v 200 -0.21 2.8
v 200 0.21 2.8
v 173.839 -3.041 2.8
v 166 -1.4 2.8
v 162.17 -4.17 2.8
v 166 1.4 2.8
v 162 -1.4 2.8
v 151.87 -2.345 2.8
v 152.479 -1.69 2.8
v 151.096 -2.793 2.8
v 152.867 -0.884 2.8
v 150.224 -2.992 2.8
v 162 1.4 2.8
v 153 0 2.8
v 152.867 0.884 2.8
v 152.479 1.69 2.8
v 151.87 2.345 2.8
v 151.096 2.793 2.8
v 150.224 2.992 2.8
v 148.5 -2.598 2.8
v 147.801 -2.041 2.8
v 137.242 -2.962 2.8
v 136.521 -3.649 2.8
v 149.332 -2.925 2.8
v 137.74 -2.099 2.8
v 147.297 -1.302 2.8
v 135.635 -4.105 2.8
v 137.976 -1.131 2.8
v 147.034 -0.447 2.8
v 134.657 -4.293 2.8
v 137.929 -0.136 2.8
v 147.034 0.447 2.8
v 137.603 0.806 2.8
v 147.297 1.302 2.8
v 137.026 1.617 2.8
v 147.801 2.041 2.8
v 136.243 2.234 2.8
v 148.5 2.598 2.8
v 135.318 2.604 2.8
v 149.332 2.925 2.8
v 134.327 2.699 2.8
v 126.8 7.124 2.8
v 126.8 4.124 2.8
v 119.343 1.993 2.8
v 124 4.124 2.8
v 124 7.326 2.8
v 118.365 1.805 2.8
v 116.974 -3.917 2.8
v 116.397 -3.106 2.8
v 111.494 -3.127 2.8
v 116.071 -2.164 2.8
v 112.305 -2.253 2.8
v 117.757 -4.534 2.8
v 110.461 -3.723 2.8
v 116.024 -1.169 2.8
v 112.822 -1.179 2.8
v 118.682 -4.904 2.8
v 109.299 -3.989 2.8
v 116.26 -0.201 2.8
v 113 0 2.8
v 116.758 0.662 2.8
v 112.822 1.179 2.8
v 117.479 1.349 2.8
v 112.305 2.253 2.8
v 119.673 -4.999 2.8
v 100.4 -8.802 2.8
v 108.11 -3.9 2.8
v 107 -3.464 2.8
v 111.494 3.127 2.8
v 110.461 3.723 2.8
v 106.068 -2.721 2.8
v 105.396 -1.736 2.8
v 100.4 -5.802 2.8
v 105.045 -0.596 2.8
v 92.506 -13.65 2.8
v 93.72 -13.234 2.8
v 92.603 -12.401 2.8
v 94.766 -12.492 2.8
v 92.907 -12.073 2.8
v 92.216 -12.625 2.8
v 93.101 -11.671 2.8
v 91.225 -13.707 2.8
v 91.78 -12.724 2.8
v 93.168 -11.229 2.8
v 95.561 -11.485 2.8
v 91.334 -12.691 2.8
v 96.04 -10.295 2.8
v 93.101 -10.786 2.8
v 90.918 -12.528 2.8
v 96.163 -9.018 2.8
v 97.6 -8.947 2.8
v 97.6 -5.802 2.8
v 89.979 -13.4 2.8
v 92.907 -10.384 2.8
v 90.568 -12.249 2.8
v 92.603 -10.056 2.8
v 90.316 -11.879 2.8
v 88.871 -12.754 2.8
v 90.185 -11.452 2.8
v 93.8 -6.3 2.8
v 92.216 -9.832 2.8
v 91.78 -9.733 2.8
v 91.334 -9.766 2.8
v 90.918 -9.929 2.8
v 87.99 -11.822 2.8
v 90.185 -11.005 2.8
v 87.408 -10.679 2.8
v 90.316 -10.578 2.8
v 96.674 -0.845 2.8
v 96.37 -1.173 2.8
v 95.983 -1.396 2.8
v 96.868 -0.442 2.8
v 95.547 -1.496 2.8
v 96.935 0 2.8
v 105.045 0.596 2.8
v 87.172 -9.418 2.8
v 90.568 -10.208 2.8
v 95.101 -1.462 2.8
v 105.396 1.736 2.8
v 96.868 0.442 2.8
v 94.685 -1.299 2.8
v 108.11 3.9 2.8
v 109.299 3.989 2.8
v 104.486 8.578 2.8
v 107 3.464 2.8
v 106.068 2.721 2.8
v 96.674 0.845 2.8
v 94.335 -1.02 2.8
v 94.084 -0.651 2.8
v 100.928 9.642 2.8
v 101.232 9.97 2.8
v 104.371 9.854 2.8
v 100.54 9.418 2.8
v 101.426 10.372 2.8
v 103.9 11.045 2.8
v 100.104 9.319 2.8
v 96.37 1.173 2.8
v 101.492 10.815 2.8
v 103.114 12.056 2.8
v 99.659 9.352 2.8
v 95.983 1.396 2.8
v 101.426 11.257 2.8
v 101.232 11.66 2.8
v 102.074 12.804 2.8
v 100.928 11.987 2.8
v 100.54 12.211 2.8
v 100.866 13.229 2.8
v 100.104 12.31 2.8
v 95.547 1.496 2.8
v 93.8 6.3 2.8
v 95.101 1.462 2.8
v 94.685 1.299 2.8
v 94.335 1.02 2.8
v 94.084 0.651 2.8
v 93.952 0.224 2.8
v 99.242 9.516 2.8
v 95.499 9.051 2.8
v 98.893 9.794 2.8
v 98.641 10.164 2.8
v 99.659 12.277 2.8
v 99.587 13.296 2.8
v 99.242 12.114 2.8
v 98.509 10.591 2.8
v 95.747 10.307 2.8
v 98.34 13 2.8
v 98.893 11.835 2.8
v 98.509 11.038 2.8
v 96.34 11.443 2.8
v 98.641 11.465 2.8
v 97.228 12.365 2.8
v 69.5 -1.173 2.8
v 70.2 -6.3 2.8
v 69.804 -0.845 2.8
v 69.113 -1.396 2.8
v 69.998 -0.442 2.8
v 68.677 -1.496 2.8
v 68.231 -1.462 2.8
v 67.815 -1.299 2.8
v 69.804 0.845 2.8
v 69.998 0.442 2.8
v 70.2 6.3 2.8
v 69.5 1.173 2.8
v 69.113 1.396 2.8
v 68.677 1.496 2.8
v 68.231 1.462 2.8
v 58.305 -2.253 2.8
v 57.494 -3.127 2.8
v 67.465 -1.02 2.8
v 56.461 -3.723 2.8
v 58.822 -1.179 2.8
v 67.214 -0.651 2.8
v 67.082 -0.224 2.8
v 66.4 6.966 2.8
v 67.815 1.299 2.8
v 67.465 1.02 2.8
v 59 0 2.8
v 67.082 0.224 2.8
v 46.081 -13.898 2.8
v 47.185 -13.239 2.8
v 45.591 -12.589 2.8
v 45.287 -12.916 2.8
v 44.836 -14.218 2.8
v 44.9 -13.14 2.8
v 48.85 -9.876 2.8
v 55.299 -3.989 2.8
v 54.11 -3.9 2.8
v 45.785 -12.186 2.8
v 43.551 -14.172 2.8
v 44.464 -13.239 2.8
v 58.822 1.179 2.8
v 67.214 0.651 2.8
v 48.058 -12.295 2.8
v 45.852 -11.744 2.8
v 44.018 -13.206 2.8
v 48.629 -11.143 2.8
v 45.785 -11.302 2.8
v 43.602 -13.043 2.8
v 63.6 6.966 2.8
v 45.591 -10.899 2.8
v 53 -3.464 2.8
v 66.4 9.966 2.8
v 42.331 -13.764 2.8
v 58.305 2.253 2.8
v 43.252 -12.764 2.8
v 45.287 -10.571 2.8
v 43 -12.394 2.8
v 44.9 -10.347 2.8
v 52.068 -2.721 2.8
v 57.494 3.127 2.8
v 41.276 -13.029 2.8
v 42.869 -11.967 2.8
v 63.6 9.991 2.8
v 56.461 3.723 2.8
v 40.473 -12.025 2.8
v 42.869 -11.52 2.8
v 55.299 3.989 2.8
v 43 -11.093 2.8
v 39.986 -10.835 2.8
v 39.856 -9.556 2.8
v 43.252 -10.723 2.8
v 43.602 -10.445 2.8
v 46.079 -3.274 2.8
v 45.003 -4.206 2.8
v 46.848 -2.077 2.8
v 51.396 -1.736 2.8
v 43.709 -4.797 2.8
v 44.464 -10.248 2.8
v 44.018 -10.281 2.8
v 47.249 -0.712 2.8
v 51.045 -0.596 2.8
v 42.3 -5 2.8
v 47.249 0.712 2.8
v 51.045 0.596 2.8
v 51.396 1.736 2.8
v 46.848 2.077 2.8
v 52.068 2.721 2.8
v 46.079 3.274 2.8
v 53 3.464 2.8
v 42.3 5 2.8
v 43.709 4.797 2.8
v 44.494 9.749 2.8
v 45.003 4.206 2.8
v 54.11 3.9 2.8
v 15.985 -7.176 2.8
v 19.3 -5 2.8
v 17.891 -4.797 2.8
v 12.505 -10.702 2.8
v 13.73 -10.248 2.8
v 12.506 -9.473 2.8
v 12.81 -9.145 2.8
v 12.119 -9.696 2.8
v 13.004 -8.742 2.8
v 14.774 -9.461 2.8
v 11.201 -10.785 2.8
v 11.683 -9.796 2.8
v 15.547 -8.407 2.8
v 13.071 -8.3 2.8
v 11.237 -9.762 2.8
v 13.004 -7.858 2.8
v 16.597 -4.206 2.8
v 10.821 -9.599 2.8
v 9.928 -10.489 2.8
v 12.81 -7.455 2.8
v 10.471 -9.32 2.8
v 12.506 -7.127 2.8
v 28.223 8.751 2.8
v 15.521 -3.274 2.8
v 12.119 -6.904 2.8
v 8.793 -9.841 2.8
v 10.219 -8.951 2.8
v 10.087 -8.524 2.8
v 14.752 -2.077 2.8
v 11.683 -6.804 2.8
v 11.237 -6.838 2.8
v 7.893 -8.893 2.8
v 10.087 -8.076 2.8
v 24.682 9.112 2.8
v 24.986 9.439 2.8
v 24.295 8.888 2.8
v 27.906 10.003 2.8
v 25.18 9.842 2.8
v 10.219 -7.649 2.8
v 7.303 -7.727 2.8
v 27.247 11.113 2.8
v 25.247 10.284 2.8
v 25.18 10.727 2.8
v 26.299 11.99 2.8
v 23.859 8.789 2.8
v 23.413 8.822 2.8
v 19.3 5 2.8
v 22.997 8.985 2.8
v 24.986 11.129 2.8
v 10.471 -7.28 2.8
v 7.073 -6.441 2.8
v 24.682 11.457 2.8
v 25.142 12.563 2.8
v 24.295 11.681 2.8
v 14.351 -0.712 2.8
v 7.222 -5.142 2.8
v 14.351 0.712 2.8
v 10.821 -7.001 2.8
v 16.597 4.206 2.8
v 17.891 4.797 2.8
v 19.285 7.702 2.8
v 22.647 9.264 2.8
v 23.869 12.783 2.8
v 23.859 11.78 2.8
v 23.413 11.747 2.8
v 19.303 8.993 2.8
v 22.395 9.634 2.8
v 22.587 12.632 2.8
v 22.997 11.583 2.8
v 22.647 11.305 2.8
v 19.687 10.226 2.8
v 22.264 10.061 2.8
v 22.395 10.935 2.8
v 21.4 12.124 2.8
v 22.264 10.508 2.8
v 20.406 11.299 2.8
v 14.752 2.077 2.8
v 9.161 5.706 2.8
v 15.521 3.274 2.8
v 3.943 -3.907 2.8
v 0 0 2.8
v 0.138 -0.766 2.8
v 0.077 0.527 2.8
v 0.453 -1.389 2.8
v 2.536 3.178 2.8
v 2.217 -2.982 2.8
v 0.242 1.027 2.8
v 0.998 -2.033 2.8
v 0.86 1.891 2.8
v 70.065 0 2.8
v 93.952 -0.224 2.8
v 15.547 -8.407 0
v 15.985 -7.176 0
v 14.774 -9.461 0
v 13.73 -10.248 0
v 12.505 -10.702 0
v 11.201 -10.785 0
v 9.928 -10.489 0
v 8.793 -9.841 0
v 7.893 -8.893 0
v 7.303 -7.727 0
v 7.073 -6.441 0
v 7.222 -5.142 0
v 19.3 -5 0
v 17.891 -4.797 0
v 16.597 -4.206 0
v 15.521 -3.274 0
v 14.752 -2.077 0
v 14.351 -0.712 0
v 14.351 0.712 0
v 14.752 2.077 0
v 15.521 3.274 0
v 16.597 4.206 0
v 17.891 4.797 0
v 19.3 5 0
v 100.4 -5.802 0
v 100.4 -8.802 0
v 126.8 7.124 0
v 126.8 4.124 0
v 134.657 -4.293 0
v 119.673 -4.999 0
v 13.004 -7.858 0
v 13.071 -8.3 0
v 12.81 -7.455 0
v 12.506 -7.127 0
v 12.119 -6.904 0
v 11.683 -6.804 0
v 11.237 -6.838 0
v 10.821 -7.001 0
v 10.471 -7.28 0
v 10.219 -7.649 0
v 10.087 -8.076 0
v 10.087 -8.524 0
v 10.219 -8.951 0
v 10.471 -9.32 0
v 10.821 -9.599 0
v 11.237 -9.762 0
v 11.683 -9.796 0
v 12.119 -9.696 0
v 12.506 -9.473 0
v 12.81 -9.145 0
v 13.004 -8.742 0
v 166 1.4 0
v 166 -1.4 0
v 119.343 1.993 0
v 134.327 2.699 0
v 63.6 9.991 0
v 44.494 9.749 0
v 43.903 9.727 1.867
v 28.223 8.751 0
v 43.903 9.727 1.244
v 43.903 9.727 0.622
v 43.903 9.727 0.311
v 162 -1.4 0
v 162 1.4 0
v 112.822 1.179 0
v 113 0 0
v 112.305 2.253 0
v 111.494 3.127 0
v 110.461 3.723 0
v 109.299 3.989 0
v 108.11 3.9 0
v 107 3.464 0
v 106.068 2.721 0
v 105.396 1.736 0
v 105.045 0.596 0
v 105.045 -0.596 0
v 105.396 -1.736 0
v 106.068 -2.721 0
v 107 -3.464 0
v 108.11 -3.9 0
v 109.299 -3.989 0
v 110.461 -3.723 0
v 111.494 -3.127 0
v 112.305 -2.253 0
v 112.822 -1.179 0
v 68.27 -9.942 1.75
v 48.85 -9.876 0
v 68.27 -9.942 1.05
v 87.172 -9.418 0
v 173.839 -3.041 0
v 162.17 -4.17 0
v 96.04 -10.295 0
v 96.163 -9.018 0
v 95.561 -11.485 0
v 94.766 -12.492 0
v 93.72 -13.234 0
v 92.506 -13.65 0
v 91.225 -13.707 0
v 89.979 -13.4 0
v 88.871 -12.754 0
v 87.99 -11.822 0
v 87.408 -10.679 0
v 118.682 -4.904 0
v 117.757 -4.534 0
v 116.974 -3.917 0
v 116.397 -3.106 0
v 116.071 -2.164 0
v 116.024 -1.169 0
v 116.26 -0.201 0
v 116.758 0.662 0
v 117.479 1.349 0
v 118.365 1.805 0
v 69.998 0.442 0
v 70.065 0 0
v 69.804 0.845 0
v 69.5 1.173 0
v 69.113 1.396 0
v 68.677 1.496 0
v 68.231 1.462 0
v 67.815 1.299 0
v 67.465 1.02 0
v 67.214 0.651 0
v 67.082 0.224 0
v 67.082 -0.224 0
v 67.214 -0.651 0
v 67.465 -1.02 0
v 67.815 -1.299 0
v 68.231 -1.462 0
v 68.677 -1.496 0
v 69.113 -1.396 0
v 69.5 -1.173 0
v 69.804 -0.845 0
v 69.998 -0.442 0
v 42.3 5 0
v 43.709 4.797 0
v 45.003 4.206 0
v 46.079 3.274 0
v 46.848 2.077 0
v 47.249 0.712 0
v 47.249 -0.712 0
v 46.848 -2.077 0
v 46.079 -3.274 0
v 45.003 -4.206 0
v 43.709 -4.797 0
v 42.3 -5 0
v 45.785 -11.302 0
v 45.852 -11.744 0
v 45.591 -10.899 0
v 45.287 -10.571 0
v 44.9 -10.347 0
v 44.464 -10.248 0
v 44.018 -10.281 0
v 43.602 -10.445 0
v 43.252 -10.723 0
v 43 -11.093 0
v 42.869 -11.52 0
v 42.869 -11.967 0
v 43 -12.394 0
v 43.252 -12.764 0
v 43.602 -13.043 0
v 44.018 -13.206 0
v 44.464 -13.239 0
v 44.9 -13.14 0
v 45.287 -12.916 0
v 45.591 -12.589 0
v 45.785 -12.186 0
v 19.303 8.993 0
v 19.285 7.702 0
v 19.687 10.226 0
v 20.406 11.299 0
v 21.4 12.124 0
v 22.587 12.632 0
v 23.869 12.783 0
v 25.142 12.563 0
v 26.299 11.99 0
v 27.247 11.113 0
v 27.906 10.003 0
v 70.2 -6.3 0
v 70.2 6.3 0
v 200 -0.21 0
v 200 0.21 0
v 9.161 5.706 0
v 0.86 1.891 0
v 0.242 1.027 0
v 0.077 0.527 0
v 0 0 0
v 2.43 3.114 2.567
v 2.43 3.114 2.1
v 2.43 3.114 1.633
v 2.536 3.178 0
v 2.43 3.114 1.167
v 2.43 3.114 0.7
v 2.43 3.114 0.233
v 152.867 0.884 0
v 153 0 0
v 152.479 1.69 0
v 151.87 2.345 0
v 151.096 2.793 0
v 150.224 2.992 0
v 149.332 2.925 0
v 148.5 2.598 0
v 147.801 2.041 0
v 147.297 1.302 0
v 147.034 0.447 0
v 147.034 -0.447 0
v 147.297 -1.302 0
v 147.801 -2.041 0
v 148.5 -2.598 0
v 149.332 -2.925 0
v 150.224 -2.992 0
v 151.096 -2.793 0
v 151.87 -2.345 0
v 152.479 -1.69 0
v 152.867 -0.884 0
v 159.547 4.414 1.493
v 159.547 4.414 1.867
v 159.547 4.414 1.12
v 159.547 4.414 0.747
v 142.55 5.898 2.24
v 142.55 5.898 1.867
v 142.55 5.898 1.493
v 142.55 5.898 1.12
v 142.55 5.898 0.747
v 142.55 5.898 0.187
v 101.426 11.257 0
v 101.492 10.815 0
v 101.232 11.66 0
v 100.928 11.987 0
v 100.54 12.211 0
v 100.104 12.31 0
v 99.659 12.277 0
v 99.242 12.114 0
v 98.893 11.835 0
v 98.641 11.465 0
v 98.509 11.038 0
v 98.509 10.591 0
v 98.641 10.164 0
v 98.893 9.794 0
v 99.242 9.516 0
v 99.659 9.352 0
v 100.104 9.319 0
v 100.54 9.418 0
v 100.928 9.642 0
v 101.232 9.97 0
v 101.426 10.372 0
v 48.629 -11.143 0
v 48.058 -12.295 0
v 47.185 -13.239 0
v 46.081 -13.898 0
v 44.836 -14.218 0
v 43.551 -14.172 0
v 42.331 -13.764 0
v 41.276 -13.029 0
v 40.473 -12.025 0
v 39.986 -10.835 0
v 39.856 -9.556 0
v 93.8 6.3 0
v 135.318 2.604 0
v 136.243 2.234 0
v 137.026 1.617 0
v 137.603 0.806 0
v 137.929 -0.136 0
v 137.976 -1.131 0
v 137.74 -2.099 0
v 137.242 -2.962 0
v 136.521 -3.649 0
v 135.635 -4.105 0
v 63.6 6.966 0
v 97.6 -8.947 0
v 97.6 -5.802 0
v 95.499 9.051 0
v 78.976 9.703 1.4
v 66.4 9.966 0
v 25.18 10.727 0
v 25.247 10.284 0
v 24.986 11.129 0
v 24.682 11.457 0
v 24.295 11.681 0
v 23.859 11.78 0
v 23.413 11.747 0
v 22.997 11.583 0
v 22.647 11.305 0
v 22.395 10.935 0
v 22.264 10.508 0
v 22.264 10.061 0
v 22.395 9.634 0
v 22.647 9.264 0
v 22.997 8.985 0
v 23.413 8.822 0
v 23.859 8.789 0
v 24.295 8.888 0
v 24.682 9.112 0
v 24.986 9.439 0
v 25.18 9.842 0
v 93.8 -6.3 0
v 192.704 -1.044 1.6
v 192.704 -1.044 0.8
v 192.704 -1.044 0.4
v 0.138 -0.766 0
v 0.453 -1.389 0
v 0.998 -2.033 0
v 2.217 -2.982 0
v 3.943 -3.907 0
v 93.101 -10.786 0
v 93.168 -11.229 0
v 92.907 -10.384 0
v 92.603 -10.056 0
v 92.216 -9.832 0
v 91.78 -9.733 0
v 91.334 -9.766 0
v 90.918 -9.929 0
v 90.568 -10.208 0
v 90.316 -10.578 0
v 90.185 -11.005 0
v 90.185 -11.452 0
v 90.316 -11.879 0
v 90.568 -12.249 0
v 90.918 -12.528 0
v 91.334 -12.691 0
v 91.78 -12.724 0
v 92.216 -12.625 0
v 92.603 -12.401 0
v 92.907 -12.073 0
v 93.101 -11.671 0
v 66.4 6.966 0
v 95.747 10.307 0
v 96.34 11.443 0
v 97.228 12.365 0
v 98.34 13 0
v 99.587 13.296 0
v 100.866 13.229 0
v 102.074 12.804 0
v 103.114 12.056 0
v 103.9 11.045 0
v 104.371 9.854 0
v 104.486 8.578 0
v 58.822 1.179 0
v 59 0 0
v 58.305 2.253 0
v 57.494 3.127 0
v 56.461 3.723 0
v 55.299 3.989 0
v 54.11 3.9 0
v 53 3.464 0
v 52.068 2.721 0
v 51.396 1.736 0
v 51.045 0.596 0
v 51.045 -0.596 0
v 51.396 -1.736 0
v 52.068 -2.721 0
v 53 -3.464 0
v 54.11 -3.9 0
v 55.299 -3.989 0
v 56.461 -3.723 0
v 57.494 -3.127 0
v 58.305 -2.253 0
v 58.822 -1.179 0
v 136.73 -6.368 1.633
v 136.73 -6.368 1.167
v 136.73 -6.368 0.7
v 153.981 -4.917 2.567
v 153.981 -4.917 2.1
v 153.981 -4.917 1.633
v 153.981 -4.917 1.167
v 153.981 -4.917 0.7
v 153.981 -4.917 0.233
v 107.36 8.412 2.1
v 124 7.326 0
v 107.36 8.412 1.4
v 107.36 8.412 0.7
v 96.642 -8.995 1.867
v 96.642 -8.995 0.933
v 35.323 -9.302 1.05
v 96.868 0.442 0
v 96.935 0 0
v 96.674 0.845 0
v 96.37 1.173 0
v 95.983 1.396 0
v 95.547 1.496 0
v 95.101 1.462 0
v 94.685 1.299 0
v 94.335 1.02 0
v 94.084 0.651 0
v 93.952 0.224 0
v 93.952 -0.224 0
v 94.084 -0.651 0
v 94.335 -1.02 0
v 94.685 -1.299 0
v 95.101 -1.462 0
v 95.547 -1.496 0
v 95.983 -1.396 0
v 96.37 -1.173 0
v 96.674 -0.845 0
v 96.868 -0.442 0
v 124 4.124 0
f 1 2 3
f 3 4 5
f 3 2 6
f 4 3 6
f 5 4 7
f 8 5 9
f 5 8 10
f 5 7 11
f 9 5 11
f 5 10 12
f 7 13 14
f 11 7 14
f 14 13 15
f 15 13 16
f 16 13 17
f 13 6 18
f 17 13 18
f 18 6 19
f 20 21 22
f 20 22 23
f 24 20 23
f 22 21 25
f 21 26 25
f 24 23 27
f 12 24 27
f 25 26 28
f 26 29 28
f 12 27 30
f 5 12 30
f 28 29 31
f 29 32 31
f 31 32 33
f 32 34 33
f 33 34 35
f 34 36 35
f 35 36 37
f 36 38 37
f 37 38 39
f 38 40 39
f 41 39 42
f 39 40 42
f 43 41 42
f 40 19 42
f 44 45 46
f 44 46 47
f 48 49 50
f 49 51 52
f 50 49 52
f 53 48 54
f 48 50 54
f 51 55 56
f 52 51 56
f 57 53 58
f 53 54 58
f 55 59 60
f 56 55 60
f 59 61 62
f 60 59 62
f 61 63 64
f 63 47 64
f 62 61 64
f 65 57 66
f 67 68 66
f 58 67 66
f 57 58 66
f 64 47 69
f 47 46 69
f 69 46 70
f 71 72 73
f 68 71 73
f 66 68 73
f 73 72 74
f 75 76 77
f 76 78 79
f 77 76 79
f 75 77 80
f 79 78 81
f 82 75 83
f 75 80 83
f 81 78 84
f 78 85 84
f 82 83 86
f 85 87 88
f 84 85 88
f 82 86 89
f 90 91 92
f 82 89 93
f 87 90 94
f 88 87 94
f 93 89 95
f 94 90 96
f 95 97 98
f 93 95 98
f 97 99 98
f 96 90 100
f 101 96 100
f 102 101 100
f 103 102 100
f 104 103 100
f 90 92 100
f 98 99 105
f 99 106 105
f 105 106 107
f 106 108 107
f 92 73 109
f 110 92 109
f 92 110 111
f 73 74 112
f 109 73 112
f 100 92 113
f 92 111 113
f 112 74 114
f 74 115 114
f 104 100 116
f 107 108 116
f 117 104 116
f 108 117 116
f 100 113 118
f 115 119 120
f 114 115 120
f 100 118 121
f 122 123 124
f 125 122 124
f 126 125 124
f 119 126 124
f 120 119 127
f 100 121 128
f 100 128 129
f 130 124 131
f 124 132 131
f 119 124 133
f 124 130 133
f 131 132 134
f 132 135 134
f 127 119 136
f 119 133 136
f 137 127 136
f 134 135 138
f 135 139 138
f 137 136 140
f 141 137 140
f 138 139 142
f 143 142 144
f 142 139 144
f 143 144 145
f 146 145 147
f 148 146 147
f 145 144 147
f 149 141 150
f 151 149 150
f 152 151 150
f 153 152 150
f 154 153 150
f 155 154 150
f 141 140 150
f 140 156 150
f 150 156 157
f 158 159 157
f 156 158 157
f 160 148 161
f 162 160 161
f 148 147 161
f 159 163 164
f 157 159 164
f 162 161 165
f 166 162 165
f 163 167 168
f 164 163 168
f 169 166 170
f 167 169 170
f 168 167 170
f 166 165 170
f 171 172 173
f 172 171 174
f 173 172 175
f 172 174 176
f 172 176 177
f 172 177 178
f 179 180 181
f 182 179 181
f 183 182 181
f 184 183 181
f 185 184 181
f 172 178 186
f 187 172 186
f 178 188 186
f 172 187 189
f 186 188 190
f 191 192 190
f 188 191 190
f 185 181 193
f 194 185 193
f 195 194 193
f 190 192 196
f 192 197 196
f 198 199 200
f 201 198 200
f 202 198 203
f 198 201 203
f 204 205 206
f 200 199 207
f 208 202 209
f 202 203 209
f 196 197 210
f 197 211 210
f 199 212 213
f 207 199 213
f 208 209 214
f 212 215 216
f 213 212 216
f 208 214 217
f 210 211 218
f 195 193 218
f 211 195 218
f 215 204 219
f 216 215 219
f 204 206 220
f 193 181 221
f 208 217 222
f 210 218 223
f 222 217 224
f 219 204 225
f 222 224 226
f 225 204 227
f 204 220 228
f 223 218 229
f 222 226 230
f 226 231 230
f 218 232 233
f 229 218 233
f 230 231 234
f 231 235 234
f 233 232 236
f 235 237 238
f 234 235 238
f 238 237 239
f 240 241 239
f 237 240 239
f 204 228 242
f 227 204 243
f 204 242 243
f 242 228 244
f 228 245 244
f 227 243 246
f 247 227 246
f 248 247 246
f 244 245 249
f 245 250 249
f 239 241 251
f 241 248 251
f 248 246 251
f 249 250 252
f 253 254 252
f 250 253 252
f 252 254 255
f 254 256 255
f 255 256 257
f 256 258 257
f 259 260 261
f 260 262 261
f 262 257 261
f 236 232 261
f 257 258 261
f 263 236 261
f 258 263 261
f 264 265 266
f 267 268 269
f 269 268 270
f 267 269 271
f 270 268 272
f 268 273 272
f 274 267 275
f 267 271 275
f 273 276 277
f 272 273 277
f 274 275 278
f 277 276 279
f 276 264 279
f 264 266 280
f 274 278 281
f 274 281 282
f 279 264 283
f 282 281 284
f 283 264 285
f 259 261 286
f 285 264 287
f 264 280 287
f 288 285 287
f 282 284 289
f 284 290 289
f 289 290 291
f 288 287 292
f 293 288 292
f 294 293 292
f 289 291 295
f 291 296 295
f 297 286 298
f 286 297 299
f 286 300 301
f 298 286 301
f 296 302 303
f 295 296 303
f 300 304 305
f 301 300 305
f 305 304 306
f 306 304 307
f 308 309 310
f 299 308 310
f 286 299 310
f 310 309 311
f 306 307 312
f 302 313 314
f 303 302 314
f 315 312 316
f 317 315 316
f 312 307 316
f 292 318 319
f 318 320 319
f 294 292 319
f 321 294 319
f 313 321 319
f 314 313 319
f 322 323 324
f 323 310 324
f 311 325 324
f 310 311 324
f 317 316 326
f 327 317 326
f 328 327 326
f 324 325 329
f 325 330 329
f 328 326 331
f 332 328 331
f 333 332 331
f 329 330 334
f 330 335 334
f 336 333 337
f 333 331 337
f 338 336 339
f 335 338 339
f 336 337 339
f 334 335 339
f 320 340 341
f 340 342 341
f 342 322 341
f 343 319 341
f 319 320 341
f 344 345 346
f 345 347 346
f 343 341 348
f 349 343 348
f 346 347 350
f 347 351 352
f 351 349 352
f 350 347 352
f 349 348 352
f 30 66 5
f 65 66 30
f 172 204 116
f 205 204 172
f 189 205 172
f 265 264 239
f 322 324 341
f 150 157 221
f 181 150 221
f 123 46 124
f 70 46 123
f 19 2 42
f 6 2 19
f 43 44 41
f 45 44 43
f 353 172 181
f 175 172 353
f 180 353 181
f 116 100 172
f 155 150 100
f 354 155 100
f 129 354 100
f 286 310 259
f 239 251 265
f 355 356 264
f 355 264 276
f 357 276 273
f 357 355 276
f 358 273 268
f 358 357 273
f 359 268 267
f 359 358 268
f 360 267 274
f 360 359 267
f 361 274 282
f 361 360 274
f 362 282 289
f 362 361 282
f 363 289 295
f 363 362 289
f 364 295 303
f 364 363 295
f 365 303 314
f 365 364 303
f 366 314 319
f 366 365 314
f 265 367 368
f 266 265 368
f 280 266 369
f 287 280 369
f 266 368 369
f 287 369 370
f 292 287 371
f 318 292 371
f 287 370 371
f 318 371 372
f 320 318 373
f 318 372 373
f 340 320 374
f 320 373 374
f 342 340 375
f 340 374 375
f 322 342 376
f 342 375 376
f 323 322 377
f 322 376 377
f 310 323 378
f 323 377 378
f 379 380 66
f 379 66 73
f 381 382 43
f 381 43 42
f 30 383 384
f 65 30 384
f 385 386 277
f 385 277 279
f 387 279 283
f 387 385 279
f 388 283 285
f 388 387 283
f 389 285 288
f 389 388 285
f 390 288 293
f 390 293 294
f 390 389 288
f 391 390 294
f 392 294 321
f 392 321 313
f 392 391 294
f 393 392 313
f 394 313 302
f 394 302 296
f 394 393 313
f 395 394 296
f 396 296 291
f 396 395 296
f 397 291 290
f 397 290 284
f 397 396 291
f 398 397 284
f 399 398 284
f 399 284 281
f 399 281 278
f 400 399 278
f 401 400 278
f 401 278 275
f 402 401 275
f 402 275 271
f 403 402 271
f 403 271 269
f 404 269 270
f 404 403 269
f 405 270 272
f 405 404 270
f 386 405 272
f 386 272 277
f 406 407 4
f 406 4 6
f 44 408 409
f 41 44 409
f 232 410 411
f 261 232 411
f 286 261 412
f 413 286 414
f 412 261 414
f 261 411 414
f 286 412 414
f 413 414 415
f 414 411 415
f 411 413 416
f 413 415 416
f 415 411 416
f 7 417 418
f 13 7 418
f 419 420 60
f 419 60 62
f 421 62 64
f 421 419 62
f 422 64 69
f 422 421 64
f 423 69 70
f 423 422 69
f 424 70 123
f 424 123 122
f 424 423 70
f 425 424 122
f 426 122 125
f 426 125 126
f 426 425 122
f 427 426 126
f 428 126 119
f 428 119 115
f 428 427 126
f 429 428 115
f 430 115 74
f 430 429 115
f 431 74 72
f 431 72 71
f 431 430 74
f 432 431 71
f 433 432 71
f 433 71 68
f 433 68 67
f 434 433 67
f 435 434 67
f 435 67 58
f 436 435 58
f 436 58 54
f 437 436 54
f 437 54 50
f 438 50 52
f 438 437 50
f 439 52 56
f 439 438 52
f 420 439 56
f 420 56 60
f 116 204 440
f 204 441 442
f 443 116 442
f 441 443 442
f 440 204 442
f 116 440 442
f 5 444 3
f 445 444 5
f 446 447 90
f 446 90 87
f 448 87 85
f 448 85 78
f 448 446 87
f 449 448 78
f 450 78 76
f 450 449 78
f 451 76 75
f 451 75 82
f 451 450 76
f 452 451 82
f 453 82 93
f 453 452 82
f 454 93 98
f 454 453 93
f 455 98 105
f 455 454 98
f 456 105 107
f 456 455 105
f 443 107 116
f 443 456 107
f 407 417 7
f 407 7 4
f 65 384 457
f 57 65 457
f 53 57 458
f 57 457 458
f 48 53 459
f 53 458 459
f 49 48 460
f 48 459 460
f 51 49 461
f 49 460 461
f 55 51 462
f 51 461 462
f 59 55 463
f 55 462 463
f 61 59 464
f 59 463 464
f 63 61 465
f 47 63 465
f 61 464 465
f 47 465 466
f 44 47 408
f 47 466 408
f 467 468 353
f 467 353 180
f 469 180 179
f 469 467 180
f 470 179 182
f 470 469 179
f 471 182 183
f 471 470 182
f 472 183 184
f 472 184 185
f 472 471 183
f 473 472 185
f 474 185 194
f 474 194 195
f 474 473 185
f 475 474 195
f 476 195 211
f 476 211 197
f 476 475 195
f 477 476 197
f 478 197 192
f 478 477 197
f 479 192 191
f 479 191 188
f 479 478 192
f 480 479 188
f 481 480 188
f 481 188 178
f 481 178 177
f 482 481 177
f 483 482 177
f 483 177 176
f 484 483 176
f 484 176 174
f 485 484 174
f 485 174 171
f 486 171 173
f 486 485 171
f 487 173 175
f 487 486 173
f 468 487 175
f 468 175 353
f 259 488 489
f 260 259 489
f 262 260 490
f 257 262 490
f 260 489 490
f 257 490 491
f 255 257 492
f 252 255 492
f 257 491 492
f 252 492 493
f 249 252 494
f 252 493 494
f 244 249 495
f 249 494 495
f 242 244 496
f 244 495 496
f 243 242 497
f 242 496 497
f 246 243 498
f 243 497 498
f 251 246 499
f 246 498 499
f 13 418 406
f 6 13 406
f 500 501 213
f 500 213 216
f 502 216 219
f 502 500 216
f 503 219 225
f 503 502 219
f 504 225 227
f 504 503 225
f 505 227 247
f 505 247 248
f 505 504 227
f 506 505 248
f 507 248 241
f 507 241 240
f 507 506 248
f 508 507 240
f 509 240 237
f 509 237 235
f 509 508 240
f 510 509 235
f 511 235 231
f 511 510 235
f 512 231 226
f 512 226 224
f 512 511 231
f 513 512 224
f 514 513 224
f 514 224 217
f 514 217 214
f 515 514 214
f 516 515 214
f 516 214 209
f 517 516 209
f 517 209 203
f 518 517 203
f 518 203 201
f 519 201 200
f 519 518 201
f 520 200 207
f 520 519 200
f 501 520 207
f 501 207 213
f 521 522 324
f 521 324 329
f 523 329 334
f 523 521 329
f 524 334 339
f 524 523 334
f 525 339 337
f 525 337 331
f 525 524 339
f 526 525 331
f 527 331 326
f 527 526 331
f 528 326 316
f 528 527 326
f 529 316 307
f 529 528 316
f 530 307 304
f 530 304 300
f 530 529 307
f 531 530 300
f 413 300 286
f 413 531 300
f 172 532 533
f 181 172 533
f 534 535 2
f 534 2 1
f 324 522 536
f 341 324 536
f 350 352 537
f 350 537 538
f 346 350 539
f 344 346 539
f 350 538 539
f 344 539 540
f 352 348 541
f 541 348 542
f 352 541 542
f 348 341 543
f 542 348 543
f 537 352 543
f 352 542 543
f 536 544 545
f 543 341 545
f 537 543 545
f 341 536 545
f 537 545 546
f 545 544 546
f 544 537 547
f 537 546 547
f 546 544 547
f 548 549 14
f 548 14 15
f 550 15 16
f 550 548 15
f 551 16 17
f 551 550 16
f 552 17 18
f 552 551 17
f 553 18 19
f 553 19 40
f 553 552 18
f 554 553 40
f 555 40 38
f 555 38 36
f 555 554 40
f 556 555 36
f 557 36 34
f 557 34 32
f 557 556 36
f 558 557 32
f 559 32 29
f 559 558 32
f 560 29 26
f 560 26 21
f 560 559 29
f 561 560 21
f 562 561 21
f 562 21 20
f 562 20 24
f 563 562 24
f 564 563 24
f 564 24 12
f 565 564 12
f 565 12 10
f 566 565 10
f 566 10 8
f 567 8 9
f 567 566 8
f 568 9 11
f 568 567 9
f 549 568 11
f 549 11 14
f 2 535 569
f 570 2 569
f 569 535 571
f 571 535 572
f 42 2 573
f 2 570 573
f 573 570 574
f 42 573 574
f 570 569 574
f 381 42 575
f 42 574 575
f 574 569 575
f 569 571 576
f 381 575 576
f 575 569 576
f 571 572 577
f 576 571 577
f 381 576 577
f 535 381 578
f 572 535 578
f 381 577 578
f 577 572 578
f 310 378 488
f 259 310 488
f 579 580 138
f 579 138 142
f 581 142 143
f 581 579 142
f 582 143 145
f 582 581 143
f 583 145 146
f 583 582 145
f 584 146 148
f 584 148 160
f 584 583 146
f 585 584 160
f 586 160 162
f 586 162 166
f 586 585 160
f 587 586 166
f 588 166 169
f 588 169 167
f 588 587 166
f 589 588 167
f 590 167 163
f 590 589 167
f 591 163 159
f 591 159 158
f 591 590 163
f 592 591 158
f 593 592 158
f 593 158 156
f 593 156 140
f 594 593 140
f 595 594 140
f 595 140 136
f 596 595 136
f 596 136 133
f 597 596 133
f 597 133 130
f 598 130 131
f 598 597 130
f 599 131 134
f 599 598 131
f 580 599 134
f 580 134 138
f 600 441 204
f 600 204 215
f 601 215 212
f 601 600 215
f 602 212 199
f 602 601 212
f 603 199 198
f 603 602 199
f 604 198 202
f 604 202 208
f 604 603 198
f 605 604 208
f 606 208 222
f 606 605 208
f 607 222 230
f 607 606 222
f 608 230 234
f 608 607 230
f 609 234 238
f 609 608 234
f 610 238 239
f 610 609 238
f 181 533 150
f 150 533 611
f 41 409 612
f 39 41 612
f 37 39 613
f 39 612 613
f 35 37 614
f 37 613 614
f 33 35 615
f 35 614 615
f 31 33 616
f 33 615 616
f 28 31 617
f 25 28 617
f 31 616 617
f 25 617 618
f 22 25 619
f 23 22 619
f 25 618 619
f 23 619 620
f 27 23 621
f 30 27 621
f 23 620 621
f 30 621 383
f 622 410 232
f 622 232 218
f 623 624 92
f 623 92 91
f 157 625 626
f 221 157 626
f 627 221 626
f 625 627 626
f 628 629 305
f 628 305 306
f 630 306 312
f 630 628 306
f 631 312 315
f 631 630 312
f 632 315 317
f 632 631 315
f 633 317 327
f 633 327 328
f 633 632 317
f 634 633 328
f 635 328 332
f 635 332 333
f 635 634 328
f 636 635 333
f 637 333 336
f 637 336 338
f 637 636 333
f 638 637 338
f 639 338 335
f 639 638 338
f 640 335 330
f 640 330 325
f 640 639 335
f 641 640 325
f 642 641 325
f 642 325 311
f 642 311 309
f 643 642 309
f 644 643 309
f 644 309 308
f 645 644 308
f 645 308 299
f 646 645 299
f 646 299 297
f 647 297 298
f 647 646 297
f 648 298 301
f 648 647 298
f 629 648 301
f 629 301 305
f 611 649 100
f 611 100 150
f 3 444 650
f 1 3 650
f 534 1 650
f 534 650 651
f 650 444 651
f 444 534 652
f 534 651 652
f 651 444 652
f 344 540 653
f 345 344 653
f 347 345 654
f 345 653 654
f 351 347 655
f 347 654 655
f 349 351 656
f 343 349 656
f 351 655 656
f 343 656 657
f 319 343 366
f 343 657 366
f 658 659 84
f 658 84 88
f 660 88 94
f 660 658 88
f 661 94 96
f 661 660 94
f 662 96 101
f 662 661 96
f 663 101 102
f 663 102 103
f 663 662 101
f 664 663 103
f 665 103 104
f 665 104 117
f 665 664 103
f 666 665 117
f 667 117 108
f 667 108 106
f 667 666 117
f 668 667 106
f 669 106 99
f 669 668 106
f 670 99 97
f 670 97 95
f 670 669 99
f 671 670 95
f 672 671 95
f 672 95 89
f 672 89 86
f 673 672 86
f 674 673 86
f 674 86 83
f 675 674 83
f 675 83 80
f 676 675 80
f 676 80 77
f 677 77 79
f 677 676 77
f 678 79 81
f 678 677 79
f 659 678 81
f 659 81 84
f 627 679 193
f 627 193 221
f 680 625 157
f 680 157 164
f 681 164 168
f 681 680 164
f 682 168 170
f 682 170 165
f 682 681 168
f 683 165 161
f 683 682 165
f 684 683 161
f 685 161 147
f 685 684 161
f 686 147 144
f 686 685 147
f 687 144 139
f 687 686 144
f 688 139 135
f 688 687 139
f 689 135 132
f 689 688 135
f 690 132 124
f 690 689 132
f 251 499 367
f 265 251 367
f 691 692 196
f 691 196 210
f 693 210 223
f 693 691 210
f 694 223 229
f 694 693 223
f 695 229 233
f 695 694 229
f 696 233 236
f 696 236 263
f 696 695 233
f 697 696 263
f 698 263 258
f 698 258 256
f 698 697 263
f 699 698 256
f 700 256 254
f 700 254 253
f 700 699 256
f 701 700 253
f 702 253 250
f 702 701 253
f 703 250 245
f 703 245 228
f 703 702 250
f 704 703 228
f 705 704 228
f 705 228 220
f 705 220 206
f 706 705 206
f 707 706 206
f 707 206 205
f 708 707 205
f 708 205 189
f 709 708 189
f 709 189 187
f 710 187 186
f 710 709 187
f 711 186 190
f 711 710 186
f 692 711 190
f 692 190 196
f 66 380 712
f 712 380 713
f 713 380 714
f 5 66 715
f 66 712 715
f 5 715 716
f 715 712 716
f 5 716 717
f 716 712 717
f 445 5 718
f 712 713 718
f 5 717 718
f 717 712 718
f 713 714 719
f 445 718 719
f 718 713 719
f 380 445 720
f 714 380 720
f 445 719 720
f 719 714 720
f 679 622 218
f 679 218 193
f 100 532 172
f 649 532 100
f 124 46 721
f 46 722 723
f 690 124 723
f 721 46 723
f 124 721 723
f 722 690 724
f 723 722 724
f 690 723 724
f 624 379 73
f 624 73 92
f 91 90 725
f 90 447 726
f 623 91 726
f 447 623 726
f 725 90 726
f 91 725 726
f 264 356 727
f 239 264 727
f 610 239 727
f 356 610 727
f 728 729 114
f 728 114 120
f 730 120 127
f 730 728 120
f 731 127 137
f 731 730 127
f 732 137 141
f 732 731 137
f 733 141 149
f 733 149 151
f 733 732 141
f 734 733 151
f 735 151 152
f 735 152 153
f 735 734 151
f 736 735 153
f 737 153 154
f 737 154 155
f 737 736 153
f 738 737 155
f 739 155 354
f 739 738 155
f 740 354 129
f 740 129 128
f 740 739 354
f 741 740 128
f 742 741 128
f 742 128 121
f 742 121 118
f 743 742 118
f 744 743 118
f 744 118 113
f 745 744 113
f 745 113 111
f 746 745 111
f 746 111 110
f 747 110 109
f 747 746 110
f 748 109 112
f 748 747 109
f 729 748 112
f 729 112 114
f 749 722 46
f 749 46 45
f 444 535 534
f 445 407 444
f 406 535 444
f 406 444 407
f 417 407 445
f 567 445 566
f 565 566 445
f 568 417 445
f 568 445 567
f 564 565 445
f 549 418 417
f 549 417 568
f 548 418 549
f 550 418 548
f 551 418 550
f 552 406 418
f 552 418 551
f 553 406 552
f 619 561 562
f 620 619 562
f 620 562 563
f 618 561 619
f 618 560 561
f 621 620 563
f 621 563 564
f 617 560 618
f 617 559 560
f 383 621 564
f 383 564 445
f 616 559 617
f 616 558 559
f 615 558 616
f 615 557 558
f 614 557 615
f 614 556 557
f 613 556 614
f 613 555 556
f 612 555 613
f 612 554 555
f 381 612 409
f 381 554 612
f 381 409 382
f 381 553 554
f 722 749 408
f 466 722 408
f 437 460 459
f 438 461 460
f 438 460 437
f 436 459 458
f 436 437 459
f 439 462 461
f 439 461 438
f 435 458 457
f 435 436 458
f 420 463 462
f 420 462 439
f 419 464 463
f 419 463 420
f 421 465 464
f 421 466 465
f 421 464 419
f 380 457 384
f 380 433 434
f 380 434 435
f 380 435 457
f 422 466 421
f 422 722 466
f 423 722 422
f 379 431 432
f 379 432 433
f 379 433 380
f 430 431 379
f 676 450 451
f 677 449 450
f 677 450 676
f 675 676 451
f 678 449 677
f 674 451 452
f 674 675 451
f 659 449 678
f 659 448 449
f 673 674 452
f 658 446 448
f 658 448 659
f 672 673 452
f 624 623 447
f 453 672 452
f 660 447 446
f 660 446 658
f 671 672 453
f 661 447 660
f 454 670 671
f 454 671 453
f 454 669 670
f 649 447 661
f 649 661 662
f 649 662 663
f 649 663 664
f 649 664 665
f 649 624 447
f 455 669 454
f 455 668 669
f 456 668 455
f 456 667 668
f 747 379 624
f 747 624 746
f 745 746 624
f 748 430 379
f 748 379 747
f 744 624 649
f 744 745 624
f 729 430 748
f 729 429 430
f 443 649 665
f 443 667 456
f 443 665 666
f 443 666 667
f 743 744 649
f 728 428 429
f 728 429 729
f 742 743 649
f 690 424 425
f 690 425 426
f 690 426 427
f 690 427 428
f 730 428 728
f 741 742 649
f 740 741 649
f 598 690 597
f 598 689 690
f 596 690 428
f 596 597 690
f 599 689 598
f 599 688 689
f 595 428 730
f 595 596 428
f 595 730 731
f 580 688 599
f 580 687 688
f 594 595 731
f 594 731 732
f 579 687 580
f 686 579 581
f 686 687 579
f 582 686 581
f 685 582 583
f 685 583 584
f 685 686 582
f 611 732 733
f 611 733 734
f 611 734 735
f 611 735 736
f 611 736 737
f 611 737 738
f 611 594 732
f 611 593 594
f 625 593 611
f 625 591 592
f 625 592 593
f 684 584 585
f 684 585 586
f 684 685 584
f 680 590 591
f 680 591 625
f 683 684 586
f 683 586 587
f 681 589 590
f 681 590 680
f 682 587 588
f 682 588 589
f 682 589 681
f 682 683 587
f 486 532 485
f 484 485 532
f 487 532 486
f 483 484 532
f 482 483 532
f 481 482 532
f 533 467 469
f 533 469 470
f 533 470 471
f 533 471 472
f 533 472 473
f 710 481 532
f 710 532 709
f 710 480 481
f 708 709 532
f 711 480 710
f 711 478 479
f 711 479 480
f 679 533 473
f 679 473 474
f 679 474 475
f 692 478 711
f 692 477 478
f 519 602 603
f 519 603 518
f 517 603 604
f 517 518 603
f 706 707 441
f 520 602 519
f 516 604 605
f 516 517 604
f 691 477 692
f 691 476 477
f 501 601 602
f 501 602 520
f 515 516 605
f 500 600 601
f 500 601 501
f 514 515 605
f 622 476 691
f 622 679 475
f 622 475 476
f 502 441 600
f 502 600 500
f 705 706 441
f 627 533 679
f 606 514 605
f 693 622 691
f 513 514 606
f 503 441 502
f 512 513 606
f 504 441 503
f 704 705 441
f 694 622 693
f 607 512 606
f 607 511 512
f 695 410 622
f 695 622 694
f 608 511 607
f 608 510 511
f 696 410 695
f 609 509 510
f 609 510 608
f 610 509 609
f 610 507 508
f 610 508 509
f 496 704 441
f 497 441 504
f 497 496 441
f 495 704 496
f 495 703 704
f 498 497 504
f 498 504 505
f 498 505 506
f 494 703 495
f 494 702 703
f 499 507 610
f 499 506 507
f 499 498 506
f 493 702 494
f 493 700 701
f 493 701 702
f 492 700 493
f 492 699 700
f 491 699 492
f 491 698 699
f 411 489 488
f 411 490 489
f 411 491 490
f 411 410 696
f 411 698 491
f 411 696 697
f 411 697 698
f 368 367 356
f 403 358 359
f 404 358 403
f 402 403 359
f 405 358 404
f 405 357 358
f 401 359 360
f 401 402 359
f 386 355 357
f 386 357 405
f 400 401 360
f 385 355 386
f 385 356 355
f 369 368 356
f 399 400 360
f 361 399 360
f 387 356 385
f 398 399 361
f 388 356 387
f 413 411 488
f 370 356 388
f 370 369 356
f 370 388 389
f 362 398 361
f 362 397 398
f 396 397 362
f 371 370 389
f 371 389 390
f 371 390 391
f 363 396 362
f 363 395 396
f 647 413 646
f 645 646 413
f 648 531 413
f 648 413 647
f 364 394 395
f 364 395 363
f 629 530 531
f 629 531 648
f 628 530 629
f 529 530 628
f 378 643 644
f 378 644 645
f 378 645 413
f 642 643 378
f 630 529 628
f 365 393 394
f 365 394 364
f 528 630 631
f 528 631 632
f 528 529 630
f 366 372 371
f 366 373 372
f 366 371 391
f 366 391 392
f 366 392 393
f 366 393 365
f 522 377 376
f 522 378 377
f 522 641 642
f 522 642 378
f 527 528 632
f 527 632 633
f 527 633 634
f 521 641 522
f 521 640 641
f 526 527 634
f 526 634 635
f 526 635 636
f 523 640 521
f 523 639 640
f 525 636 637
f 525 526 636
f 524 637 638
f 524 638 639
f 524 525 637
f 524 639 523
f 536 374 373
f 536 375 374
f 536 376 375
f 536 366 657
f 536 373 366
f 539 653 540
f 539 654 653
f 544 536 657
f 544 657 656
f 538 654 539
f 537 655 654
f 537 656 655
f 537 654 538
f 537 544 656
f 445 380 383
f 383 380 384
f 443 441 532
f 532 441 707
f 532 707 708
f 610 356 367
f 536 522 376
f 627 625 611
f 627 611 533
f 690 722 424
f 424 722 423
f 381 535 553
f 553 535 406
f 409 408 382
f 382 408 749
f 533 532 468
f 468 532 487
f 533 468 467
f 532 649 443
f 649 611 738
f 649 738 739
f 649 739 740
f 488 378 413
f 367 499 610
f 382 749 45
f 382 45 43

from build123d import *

# Parameters (mm, degrees)
SKETCH_3_R      = 4
SKETCH_3_R_2    = 3
SKETCH_3_R_3    = 1.5
SKETCH_3_R_4    = 1.500000004
SKETCH_3_R_5    = 1.499999999
SKETCH_3_W      = 23.6
SKETCH_3_H      = 12.6
SKETCH_3_W_2    = 4
SKETCH_3_H_2    = 2.8
EXTRUDE_3_DEPTH = 2.8


with BuildPart() as part:
    # Эскиз3 → Бобышка-Вытянуть3 (new body)
    with BuildSketch(Plane.XY):
        with BuildLine():
            Line((200, 0.21), (200, -0.21))
            add(Edge.make_bspline(
                [(173.839461144, -3.040801203), (175.943333039, -2.830170954), (179.564023078, -2.461029339), (184.58704572, -1.932479181), (188.771568451, -1.480695182), (192.530784687, -1.065063842), (195.747560944, -0.701689979), (198.179524953, -0.422303954), (199.520051416, -0.265971644), (200, -0.21)],
                knots=[0.870307302, 0.870307302, 0.870307302, 0.870307302, 0.901571134, 0.924121062, 0.944988816, 0.963803939, 0.980044339, 0.992855276, 1, 1, 1, 1], degree=3))
            Line((173.839461144, -3.040801203), (162.170244806, -4.170244806))
            add(Edge.make_bspline(
                [(100.4, -8.802264), (100.782530515, -8.78200637), (103.102887785, -8.657921344), (107.374551667, -8.416266925), (113.223109349, -8.057497647), (119.097620698, -7.671146294), (124.98256269, -7.259840679), (130.861479372, -6.826169971), (136.716836604, -6.372892076), (142.52985565, -5.902766003), (148.280267017, -5.418602057), (153.94609331, -4.923426646), (158.566687276, -4.50520567), (161.295968592, -4.251994411), (162.170244806, -4.170244806)],
                knots=[0.507199784, 0.507199784, 0.507199784, 0.507199784, 0.512863887, 0.541558094, 0.570462313, 0.599504248, 0.628607349, 0.657690446, 0.686667237, 0.715444849, 0.743923546, 0.77199483, 0.799540253, 0.812523886, 0.812523886, 0.812523886, 0.812523886], degree=3))
            Line((100.4, -8.802264), (100.4, -5.802264))
            Line((100.4, -5.802264), (97.6, -5.802264))
            Line((97.6, -5.802264), (97.6, -8.946938935))
            add(Edge.make_bspline(
                [(96.16294038, -9.018329177), (96.641976589, -8.994862294), (97.120996479, -8.971063118), (97.6, -8.946938935)],
                knots=[0.486289284, 0.486289284, 0.486289284, 0.486289284, 0.493380908, 0.493380908, 0.493380908, 0.493380908], degree=3))
            ThreePointArc((96.16294038, -9.018329177), (91.867526446, -13.724080291), (87.17182932, -9.417677743))
            add(Edge.make_bspline(
                [(48.849842288, -9.876307099), (50.29548458, -9.910701869), (53.368870018, -9.967597185), (58.119580476, -10.007674079), (63.1472323, -10.001179647), (68.312112853, -9.948180779), (73.603706203, -9.849984193), (79.011121779, -9.708185508), (83.546665754, -9.557168434), (86.278412172, -9.453068368), (87.17182932, -9.417677743)],
                knots=[0.253007448, 0.253007448, 0.253007448, 0.253007448, 0.274388983, 0.298458209, 0.323253842, 0.348727971, 0.374830387, 0.40150919, 0.428710016, 0.441930624, 0.441930624, 0.441930624, 0.441930624], degree=3))
            ThreePointArc((48.849842288, -9.876307099), (44.191437181, -14.24080929), (39.855729482, -9.55559251))
            add(Edge.make_bspline(
                [(15.984525285, -7.176038428), (16.462030484, -7.259158951), (17.98454817, -7.513637269), (20.631718929, -7.904294519), (23.999672572, -8.325205071), (27.586779878, -8.701741845), (31.384869898, -9.032475932), (35.385580654, -9.316092874), (38.232256125, -9.476007566), (39.743803487, -9.550160154), (39.855729482, -9.55559251)],
                knots=[0.090340762, 0.090340762, 0.090340762, 0.090340762, 0.097507218, 0.113164082, 0.12990269, 0.147690304, 0.166492185, 0.186271967, 0.206991861, 0.208648761, 0.208648761, 0.208648761, 0.208648761], degree=3))
            ThreePointArc((15.984525285, -7.176038428), (10.553276044, -10.683492951), (7.222061882, -5.142399398))
            add(Edge.make_bspline(
                [(0, 0), (0.032444913, -0.278495812), (0.100633198, -0.863800259), (0.62379252, -1.678905598), (1.407454519, -2.445359097), (2.482159911, -3.178007514), (3.831515726, -3.881540279), (5.438246861, -4.54900077), (6.605008441, -4.947778836), (7.222061882, -5.142399398)],
                knots=[0, 0, 0, 0, 0.004099011, 0.008614742, 0.013934855, 0.020277775, 0.027752981, 0.036410215, 0.045976094, 0.045976094, 0.045976094, 0.045976094], degree=3))
            add(Edge.make_bspline(
                [(19.284694791, 7.702161614), (18.661991317, 7.611303464), (17.067549655, 7.367338744), (14.58489291, 6.936612431), (11.921305119, 6.393879384), (9.507426038, 5.81478546), (7.350195056, 5.201638101), (5.45639967, 4.556541724), (3.831515725, 3.88154028), (2.48215991, 3.178007515), (1.407454518, 2.445359098), (0.62379252, 1.678905598), (0.100633198, 0.863800259), (0.032444913, 0.278495812), (0, 0)],
                knots=[0.893188074, 0.893188074, 0.893188074, 0.893188074, 0.902492782, 0.917037139, 0.930441054, 0.942679762, 0.953733567, 0.963589785, 0.972247019, 0.979722225, 0.986065145, 0.991385258, 0.995900989, 1, 1, 1, 1], degree=3))
            ThreePointArc((19.284694791, 7.702161614), (23.222530105, 12.753724018), (28.222638882, 8.75075738))
            add(Edge.make_bspline(
                [(63.6, 9.990751447), (63.433767139, 9.991846739), (61.590618822, 10.003190391), (58.119580476, 10.007674079), (53.23934089, 9.96650448), (48.51637403, 9.877065972), (43.960263435, 9.738807032), (39.580313293, 9.551735955), (35.385580654, 9.316092874), (31.619699098, 9.049123359), (29.254379223, 8.84661187), (28.222638882, 8.75075738)],
                knots=[0.674288155, 0.674288155, 0.674288155, 0.674288155, 0.676746158, 0.701541791, 0.725611017, 0.748907835, 0.771387785, 0.793008139, 0.813728033, 0.833507815, 0.84882888, 0.84882888, 0.84882888, 0.84882888], degree=3))
            Line((63.6, 9.990751447), (63.6, 6.965595937))
            Line((63.6, 6.965595937), (66.4, 6.965595937))
            Line((66.4, 6.965595937), (66.4, 9.965595937))
            add(Edge.make_bspline(
                [(95.498574643, 9.050660645), (93.699350388, 9.137637837), (90.030763168, 9.305301287), (84.52309051, 9.524657051), (79.011121778, 9.708185508), (73.603706202, 9.849984193), (69.41154014, 9.927778606), (67.023185068, 9.958531818), (66.4, 9.965595937)],
                knots=[0.516989075, 0.516989075, 0.516989075, 0.516989075, 0.543623846, 0.571289984, 0.59849081, 0.625169613, 0.651272029, 0.660487149, 0.660487149, 0.660487149, 0.660487149], degree=3))
            ThreePointArc((95.498574643, 9.050660645), (100.228464185, 13.308356698), (104.486160238, 8.578467155))
            add(Edge.make_bspline(
                [(124, 7.326294797), (122.364596134, 7.442700413), (118.769611386, 7.692718614), (113.223109349, 8.057497647), (108.353742435, 8.356200224), (105.444206381, 8.524292737), (104.486160238, 8.578467155)],
                knots=[0.376253135, 0.376253135, 0.376253135, 0.376253135, 0.400495752, 0.429537687, 0.458441906, 0.47263041, 0.47263041, 0.47263041, 0.47263041], degree=3))
            Line((124, 7.326294797), (124, 4.124412105))
            Line((124, 4.124412105), (126.8, 4.124412105))
            Line((126.8, 4.124412105), (126.8, 7.124412105))
            add(Edge.make_bspline(
                [(200, 0.21), (199.520051416, 0.265971644), (198.179524953, 0.422303954), (195.747560944, 0.701689979), (192.530784687, 1.065063842), (188.771568451, 1.480695182), (184.58704572, 1.932479181), (180.05616868, 2.409243063), (175.238405485, 2.90257428), (168.371896377, 3.585728287), (161.260104983, 4.261418012), (153.94609331, 4.923426646), (148.280267017, 5.418602057), (142.52985565, 5.902766003), (136.716836604, 6.372892076), (131.466708661, 6.779317653), (128.156255998, 7.025385403), (126.8, 7.124412105)],
                knots=[0, 0, 0, 0, 0.007144724, 0.019955661, 0.036196061, 0.055011184, 0.075878938, 0.098428866, 0.122375554, 0.147487885, 0.200459747, 0.22800517, 0.256076454, 0.284555151, 0.313332763, 0.342309554, 0.362416837, 0.362416837, 0.362416837, 0.362416837], degree=3))
        make_face()
        with Locations((109, 0)):
            Circle(SKETCH_3_R, mode=Mode.SUBTRACT)
        with Locations((55, 0)):
            Circle(SKETCH_3_R, mode=Mode.SUBTRACT)
        with Locations((150, 0)):
            Circle(SKETCH_3_R_2, mode=Mode.SUBTRACT)
        with Locations((68.565, 0)):
            Circle(SKETCH_3_R_3, mode=Mode.SUBTRACT)
        with Locations((95.435, 0)):
            Circle(SKETCH_3_R_3, mode=Mode.SUBTRACT)
        with Locations((23.746872016, 10.284376689)):
            Circle(SKETCH_3_R_4, mode=Mode.SUBTRACT)
        with Locations((11.570620364, -8.299999991)):
            Circle(SKETCH_3_R_5, mode=Mode.SUBTRACT)
        with Locations((44.351797521, -11.743667469)):
            Circle(SKETCH_3_R_5, mode=Mode.SUBTRACT)
        with Locations((91.667851618, -11.228512478)):
            Circle(SKETCH_3_R_3, mode=Mode.SUBTRACT)
        with Locations((99.99236744, 10.8145639)):
            Circle(SKETCH_3_R_3, mode=Mode.SUBTRACT)
        with BuildLine():
            Line((19.3, 5), (42.3, 5))
            ThreePointArc((42.3, 5), (47.3, 0), (42.3, -5))
            Line((42.3, -5), (19.3, -5))
            ThreePointArc((19.3, -5), (14.3, 0), (19.3, 5))
        make_face(mode=Mode.SUBTRACT)
        with BuildLine():
            Line((119.34345336, 1.992816182), (134.326801485, 2.699412943))
            ThreePointArc((134.326801485, 2.699412943), (137.987788625, -0.631829042), (134.65654664, -4.292816182))
            Line((134.65654664, -4.292816182), (119.673198515, -4.999412943))
            ThreePointArc((119.673198515, -4.999412943), (116.012211375, -1.668170958), (119.34345336, 1.992816182))
        make_face(mode=Mode.SUBTRACT)
        with Locations((82, 0)):
            Rectangle(SKETCH_3_W, SKETCH_3_H, mode=Mode.SUBTRACT)
        with Locations((164, 0)):
            Rectangle(SKETCH_3_W_2, SKETCH_3_H_2, mode=Mode.SUBTRACT)
    extrude(amount=EXTRUDE_3_DEPTH)


solid = part.part
